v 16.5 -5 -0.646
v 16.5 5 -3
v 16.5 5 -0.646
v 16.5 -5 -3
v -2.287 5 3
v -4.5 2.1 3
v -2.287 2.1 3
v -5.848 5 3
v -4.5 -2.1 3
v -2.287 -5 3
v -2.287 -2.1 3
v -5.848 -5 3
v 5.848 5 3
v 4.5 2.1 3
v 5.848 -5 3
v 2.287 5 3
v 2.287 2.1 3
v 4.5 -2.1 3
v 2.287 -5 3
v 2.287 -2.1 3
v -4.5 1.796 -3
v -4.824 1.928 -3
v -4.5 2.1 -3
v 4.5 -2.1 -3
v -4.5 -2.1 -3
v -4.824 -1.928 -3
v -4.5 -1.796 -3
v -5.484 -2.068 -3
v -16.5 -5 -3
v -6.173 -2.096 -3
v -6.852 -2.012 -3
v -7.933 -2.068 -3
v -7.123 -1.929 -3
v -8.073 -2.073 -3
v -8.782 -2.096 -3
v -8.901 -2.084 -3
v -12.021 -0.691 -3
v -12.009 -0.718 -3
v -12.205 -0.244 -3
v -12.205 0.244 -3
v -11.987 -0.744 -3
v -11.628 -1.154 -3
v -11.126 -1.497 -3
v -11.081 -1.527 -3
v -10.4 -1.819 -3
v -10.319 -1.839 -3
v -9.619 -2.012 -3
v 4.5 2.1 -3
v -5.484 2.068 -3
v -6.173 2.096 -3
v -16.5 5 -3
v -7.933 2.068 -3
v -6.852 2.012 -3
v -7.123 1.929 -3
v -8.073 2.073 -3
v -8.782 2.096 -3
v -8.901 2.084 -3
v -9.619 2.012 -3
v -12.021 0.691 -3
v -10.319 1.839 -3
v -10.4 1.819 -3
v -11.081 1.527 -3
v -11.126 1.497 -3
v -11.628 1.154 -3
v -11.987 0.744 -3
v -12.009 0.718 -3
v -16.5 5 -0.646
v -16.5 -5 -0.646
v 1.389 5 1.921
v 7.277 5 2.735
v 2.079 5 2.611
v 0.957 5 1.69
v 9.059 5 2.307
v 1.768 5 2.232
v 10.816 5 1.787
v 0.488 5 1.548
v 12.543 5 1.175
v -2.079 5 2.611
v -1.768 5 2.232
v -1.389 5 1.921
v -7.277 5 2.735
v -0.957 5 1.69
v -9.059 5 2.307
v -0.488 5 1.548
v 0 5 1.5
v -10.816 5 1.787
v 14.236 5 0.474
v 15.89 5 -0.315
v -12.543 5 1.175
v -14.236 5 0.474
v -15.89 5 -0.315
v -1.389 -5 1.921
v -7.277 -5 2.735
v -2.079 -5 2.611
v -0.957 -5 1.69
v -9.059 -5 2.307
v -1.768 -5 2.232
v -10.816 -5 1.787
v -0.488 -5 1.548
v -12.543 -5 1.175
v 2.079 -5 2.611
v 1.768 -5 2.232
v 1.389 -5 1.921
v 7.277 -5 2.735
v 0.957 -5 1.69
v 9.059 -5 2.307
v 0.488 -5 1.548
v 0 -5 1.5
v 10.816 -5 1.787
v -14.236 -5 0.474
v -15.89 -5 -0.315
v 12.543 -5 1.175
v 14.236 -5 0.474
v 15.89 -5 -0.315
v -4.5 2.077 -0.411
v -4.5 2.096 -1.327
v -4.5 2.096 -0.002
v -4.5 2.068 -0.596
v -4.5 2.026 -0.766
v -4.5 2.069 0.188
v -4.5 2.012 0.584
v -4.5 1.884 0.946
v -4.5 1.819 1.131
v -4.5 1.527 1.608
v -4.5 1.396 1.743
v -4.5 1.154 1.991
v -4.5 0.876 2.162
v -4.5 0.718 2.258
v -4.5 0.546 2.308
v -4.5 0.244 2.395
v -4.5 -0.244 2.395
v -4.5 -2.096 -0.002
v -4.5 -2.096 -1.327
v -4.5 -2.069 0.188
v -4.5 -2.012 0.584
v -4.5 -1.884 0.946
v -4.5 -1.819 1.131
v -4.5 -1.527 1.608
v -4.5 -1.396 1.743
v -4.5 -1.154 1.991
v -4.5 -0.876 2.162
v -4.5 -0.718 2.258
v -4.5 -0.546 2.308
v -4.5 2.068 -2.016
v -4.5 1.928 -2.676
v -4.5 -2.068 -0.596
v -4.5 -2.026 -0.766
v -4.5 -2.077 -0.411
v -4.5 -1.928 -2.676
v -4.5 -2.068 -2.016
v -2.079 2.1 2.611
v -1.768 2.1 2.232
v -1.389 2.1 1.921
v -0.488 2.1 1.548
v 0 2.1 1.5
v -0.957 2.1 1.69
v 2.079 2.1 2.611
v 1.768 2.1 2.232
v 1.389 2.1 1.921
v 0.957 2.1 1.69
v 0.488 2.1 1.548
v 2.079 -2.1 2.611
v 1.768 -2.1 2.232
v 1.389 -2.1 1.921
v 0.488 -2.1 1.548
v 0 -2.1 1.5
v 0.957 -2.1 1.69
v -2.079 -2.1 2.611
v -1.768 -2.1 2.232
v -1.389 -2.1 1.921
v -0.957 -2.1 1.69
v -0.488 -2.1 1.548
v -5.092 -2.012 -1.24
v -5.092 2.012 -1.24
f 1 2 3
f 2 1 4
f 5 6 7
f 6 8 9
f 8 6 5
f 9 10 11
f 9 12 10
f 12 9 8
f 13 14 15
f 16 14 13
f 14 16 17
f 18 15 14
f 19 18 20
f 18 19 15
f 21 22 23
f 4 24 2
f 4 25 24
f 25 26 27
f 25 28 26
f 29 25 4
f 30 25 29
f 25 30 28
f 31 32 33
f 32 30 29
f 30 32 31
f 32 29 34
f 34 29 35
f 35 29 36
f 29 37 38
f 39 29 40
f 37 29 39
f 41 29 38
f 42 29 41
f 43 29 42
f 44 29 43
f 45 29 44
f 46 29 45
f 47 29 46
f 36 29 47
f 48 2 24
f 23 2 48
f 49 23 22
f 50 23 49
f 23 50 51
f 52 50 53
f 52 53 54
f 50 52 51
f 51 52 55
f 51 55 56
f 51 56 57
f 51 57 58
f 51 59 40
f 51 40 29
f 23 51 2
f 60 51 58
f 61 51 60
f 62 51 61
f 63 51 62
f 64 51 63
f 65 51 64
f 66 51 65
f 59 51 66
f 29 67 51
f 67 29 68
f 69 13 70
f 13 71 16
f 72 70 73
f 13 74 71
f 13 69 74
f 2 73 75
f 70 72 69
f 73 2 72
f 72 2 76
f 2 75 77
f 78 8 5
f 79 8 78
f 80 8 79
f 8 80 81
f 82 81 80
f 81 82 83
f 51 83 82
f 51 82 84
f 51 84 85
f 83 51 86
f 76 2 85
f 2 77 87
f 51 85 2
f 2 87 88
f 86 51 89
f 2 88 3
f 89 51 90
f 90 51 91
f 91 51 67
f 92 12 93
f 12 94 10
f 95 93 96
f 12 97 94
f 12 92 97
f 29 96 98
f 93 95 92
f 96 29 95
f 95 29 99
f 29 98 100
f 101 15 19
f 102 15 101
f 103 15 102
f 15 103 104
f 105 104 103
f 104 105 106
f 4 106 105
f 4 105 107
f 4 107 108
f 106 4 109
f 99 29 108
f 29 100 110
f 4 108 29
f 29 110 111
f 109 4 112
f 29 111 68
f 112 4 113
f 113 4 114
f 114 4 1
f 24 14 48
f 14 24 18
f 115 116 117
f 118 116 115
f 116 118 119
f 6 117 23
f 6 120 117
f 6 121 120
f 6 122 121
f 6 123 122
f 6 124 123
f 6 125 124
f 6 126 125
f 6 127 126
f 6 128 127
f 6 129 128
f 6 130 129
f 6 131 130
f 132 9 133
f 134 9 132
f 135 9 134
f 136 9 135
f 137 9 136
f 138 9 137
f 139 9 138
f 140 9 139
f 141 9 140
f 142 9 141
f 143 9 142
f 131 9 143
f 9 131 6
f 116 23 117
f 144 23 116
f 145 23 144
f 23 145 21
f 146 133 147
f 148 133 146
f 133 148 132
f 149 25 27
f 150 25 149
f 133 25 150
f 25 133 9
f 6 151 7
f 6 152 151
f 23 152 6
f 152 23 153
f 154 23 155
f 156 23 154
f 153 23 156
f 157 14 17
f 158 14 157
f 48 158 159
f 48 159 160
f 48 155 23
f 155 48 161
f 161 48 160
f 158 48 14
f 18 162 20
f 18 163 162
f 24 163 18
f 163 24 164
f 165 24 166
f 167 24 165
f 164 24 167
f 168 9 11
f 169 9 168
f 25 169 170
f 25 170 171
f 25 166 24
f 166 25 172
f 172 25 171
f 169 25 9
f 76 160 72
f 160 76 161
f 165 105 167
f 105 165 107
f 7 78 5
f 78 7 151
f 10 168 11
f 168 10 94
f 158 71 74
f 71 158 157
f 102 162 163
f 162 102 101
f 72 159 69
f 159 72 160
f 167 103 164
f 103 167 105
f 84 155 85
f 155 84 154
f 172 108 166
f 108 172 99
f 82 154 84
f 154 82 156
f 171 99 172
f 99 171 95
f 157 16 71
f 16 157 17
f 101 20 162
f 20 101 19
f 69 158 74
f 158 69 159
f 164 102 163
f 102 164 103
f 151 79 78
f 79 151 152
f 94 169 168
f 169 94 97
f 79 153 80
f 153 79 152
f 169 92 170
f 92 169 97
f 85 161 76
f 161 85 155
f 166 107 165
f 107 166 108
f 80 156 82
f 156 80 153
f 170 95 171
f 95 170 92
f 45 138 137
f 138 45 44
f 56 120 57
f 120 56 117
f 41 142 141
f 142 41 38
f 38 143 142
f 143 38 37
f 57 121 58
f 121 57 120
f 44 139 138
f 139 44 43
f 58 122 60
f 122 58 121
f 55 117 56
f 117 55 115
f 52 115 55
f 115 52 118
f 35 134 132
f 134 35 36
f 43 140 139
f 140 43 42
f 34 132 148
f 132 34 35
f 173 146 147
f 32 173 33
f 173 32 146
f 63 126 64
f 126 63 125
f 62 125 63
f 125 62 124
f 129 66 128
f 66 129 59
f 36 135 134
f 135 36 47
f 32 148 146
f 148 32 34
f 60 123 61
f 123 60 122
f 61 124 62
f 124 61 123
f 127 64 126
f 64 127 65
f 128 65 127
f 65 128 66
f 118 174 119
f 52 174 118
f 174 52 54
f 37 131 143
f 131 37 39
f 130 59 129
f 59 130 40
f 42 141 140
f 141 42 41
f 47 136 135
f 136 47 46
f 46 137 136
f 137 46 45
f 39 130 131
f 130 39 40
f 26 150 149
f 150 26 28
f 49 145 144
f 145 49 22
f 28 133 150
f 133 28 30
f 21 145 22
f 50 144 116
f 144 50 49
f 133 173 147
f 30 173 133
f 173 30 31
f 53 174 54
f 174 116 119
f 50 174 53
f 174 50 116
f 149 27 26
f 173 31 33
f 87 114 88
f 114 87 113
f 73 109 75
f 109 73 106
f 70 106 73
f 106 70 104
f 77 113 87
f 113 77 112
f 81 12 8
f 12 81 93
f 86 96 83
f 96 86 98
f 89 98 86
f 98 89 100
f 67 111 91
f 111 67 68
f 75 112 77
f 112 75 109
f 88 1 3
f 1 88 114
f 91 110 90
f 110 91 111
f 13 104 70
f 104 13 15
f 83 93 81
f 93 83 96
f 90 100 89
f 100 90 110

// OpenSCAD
module klopart ()
{
    intersection () {
        difference () {
            cube ([33, 10, 6], center=true);
            cube ([9, 4.2, 7], center=true);
            translate ([0, 0, 4])
                rotate ([90, 0, 0])
                    cylinder (r=2.5, h=11.5, center=true);
            translate ([0, 0, 3])
                rotate ([0, 55, 0])
                    cylinder (r=2.1, h=30, center=true);
            translate ([0, 0, 3])
                rotate ([0, 45, 0])
                    cylinder (r=2.1, h=30, center=true);
        }
        translate ([0, 0, -31.5])
            rotate ([90, 0, 0])
                cylinder (r=35, h=40, center = true);
    }
}

klopart ($fa=3, $fs=.5);
